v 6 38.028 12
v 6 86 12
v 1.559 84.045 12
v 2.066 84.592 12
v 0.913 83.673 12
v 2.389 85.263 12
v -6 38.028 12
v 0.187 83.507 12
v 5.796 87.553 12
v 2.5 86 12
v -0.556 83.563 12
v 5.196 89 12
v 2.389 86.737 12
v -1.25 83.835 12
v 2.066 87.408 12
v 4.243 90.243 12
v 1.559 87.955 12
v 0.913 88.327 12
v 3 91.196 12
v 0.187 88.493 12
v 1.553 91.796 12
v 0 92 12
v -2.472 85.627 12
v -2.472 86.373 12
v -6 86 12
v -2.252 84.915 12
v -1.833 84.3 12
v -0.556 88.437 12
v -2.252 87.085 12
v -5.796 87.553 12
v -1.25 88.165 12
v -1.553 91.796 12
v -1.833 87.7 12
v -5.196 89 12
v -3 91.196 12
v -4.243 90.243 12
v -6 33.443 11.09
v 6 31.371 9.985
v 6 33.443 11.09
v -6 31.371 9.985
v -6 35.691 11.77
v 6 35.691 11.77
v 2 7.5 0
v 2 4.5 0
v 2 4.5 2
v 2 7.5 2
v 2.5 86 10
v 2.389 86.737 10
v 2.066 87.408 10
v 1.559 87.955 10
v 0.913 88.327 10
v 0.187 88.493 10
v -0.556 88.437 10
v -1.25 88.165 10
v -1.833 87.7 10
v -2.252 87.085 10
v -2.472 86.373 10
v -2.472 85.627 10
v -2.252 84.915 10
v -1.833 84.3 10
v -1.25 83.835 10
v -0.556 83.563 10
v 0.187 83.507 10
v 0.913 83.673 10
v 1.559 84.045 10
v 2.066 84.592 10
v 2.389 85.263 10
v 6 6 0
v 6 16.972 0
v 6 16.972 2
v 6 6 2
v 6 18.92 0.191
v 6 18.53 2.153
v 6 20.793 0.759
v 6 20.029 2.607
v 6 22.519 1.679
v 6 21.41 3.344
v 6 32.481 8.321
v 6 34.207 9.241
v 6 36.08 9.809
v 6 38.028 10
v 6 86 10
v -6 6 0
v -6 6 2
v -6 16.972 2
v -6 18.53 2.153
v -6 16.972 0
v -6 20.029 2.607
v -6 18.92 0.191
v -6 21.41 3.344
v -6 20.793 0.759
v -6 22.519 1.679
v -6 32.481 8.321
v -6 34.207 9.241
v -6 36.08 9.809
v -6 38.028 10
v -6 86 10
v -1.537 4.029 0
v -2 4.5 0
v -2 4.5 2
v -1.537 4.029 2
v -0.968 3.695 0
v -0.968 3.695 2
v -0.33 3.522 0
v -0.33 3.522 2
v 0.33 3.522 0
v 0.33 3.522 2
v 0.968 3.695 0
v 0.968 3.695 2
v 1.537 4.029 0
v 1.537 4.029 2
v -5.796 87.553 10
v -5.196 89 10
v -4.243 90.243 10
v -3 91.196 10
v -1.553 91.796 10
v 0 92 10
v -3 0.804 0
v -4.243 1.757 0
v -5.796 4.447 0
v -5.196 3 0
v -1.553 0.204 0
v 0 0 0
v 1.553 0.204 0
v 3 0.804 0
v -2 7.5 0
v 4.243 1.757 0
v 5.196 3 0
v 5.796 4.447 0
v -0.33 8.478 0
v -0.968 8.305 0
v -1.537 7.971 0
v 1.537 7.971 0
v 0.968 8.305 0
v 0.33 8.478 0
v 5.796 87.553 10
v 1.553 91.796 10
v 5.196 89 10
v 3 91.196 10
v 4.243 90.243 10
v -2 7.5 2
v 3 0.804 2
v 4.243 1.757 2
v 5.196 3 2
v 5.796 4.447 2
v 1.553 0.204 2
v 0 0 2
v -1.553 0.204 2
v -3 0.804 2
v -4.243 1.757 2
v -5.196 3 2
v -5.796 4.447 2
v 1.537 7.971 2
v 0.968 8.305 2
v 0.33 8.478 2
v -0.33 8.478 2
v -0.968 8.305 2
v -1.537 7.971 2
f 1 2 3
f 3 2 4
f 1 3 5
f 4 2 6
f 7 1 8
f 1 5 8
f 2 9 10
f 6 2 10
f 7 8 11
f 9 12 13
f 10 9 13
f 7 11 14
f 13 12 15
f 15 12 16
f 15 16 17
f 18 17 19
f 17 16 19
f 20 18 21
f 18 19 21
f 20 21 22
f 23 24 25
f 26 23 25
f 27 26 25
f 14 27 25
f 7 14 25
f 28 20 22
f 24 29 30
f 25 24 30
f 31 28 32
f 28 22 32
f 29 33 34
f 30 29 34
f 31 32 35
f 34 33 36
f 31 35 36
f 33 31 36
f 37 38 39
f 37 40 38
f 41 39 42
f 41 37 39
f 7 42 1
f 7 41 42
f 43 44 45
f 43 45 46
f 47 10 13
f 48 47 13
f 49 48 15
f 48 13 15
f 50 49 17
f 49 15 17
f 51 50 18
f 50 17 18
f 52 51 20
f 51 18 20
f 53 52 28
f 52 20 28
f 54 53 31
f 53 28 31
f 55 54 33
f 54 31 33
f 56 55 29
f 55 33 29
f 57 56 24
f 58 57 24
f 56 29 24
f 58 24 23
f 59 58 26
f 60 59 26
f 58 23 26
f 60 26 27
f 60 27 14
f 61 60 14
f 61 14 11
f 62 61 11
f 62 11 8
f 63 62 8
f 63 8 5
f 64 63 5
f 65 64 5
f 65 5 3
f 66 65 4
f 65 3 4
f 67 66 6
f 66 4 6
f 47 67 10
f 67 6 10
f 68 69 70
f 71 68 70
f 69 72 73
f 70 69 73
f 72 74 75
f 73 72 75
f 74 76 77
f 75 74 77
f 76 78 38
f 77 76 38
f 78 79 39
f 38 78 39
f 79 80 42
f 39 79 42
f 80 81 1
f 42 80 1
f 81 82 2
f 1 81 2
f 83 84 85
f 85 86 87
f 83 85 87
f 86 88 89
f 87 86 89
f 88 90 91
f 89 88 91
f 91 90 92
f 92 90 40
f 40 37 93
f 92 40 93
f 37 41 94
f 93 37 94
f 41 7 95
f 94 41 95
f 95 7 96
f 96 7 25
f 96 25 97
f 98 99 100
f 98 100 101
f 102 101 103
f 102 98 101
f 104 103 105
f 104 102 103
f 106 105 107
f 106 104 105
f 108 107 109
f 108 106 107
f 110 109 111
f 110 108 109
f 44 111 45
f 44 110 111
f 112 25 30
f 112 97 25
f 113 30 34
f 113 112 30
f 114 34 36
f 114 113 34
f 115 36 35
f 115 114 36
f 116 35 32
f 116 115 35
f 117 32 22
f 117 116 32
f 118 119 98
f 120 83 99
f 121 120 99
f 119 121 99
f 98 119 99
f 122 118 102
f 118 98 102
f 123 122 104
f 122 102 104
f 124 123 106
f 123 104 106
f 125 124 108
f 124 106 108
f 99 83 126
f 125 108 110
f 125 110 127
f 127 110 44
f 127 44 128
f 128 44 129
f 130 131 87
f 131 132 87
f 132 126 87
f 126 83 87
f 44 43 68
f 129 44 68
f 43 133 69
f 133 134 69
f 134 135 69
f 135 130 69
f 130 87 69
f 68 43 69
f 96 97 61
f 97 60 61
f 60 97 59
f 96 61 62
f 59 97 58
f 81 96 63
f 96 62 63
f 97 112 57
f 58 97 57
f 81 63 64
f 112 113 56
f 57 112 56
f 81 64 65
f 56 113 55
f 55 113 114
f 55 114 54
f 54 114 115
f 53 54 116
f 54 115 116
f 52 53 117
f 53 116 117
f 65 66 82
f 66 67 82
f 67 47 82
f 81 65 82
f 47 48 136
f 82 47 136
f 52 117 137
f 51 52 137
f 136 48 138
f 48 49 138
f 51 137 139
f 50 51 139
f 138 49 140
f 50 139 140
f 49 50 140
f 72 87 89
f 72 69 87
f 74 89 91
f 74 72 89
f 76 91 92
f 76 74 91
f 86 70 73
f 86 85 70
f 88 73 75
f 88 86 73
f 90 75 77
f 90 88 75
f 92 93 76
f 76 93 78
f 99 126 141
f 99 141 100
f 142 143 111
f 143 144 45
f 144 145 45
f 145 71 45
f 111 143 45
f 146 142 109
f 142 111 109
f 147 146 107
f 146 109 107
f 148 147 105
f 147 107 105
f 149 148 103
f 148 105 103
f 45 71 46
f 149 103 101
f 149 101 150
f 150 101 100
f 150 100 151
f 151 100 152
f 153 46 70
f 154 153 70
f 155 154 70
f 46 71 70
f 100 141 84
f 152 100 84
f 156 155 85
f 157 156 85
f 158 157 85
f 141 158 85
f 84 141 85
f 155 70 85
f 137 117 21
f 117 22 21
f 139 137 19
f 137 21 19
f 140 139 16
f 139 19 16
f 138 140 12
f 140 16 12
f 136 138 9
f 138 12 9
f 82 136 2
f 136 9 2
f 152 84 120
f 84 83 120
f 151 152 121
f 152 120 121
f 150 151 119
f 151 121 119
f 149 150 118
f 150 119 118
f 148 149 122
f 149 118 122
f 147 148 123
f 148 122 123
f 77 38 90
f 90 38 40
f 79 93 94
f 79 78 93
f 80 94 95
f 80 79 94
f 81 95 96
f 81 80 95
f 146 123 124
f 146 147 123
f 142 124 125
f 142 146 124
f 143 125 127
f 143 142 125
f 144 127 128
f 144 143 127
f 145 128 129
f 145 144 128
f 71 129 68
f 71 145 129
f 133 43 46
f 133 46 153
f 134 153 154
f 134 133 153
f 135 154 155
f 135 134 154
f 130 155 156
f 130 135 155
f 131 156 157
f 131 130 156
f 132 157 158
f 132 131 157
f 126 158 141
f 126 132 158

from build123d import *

# Parameters (mm, degrees)
F1_W     = 12
F1_H     = 2
F4_DEPTH = 2
F5_R     = 2.5
F6_DEPTH = 2
F7_R     = 5.99999
F8_R     = 5.99999


# Not quite as in the source:
# - a fillet or chamfer is up to 0.001 mm smaller than in the source, because OpenCascade refuses the exact size


with BuildPart() as f2:
    # F2: sweep along a path in F0
    with BuildLine(Plane.YZ) as f2_path:
        Line((0, 0), (16.9722436227, 0))
        ThreePointArc((16.9722436227, 0), (19.8700851096, 0.4290797351), (22.5192455849, 1.6794970566))
        Line((22.5192455849, 1.6794970566), (32.4807544151, 8.3205029434))
        ThreePointArc((32.4807544151, 8.3205029434), (35.1299148904, 9.5709202649), (38.0277563773, 10))
        Line((38.0277563773, 10), (92, 10))
    # F1 (on Front) → F2 (sweep)
    with BuildSketch(Plane.XZ):
        with Locations((0, 1)):
            Rectangle(F1_W, F1_H)
    sweep(path=f2_path.line)

    # F3 (on Top) → F4 (cut, through all)
    with BuildSketch(Plane.XY):
        with BuildLine():
            Line((2, 4.5), (2, 7.5))
            ThreePointArc((2, 7.5), (0, 8.5), (-2, 7.5))
            Line((-2, 7.5), (-2, 4.5))
            ThreePointArc((-2, 4.5), (0, 3.5), (2, 4.5))
        make_face()
    extrude(amount=F4_DEPTH, mode=Mode.SUBTRACT)

    # F5 (on face) → F6 (cut, through all)
    with BuildSketch(Plane.XY.offset(12)):
        with Locations((0, 86)):
            Circle(F5_R)
    extrude(amount=-F6_DEPTH, mode=Mode.SUBTRACT)

    # F7 (radius 6 in the source; OpenCascade refuses exactly that, so slightly less here)
    f7_edges = [f2.edges().sort_by_distance(p)[0] for p in [
        (6, 0, 1),
        (-6, 0, 1),
    ]]
    fillet(f7_edges, radius=F7_R)

    # F8 (radius 6 in the source; OpenCascade refuses exactly that, so slightly less here)
    f8_edges = [f2.edges().sort_by_distance(p)[0] for p in [
        (-6, 92, 11),
        (6, 92, 11),
    ]]
    fillet(f8_edges, radius=F8_R)


solid = f2.part
